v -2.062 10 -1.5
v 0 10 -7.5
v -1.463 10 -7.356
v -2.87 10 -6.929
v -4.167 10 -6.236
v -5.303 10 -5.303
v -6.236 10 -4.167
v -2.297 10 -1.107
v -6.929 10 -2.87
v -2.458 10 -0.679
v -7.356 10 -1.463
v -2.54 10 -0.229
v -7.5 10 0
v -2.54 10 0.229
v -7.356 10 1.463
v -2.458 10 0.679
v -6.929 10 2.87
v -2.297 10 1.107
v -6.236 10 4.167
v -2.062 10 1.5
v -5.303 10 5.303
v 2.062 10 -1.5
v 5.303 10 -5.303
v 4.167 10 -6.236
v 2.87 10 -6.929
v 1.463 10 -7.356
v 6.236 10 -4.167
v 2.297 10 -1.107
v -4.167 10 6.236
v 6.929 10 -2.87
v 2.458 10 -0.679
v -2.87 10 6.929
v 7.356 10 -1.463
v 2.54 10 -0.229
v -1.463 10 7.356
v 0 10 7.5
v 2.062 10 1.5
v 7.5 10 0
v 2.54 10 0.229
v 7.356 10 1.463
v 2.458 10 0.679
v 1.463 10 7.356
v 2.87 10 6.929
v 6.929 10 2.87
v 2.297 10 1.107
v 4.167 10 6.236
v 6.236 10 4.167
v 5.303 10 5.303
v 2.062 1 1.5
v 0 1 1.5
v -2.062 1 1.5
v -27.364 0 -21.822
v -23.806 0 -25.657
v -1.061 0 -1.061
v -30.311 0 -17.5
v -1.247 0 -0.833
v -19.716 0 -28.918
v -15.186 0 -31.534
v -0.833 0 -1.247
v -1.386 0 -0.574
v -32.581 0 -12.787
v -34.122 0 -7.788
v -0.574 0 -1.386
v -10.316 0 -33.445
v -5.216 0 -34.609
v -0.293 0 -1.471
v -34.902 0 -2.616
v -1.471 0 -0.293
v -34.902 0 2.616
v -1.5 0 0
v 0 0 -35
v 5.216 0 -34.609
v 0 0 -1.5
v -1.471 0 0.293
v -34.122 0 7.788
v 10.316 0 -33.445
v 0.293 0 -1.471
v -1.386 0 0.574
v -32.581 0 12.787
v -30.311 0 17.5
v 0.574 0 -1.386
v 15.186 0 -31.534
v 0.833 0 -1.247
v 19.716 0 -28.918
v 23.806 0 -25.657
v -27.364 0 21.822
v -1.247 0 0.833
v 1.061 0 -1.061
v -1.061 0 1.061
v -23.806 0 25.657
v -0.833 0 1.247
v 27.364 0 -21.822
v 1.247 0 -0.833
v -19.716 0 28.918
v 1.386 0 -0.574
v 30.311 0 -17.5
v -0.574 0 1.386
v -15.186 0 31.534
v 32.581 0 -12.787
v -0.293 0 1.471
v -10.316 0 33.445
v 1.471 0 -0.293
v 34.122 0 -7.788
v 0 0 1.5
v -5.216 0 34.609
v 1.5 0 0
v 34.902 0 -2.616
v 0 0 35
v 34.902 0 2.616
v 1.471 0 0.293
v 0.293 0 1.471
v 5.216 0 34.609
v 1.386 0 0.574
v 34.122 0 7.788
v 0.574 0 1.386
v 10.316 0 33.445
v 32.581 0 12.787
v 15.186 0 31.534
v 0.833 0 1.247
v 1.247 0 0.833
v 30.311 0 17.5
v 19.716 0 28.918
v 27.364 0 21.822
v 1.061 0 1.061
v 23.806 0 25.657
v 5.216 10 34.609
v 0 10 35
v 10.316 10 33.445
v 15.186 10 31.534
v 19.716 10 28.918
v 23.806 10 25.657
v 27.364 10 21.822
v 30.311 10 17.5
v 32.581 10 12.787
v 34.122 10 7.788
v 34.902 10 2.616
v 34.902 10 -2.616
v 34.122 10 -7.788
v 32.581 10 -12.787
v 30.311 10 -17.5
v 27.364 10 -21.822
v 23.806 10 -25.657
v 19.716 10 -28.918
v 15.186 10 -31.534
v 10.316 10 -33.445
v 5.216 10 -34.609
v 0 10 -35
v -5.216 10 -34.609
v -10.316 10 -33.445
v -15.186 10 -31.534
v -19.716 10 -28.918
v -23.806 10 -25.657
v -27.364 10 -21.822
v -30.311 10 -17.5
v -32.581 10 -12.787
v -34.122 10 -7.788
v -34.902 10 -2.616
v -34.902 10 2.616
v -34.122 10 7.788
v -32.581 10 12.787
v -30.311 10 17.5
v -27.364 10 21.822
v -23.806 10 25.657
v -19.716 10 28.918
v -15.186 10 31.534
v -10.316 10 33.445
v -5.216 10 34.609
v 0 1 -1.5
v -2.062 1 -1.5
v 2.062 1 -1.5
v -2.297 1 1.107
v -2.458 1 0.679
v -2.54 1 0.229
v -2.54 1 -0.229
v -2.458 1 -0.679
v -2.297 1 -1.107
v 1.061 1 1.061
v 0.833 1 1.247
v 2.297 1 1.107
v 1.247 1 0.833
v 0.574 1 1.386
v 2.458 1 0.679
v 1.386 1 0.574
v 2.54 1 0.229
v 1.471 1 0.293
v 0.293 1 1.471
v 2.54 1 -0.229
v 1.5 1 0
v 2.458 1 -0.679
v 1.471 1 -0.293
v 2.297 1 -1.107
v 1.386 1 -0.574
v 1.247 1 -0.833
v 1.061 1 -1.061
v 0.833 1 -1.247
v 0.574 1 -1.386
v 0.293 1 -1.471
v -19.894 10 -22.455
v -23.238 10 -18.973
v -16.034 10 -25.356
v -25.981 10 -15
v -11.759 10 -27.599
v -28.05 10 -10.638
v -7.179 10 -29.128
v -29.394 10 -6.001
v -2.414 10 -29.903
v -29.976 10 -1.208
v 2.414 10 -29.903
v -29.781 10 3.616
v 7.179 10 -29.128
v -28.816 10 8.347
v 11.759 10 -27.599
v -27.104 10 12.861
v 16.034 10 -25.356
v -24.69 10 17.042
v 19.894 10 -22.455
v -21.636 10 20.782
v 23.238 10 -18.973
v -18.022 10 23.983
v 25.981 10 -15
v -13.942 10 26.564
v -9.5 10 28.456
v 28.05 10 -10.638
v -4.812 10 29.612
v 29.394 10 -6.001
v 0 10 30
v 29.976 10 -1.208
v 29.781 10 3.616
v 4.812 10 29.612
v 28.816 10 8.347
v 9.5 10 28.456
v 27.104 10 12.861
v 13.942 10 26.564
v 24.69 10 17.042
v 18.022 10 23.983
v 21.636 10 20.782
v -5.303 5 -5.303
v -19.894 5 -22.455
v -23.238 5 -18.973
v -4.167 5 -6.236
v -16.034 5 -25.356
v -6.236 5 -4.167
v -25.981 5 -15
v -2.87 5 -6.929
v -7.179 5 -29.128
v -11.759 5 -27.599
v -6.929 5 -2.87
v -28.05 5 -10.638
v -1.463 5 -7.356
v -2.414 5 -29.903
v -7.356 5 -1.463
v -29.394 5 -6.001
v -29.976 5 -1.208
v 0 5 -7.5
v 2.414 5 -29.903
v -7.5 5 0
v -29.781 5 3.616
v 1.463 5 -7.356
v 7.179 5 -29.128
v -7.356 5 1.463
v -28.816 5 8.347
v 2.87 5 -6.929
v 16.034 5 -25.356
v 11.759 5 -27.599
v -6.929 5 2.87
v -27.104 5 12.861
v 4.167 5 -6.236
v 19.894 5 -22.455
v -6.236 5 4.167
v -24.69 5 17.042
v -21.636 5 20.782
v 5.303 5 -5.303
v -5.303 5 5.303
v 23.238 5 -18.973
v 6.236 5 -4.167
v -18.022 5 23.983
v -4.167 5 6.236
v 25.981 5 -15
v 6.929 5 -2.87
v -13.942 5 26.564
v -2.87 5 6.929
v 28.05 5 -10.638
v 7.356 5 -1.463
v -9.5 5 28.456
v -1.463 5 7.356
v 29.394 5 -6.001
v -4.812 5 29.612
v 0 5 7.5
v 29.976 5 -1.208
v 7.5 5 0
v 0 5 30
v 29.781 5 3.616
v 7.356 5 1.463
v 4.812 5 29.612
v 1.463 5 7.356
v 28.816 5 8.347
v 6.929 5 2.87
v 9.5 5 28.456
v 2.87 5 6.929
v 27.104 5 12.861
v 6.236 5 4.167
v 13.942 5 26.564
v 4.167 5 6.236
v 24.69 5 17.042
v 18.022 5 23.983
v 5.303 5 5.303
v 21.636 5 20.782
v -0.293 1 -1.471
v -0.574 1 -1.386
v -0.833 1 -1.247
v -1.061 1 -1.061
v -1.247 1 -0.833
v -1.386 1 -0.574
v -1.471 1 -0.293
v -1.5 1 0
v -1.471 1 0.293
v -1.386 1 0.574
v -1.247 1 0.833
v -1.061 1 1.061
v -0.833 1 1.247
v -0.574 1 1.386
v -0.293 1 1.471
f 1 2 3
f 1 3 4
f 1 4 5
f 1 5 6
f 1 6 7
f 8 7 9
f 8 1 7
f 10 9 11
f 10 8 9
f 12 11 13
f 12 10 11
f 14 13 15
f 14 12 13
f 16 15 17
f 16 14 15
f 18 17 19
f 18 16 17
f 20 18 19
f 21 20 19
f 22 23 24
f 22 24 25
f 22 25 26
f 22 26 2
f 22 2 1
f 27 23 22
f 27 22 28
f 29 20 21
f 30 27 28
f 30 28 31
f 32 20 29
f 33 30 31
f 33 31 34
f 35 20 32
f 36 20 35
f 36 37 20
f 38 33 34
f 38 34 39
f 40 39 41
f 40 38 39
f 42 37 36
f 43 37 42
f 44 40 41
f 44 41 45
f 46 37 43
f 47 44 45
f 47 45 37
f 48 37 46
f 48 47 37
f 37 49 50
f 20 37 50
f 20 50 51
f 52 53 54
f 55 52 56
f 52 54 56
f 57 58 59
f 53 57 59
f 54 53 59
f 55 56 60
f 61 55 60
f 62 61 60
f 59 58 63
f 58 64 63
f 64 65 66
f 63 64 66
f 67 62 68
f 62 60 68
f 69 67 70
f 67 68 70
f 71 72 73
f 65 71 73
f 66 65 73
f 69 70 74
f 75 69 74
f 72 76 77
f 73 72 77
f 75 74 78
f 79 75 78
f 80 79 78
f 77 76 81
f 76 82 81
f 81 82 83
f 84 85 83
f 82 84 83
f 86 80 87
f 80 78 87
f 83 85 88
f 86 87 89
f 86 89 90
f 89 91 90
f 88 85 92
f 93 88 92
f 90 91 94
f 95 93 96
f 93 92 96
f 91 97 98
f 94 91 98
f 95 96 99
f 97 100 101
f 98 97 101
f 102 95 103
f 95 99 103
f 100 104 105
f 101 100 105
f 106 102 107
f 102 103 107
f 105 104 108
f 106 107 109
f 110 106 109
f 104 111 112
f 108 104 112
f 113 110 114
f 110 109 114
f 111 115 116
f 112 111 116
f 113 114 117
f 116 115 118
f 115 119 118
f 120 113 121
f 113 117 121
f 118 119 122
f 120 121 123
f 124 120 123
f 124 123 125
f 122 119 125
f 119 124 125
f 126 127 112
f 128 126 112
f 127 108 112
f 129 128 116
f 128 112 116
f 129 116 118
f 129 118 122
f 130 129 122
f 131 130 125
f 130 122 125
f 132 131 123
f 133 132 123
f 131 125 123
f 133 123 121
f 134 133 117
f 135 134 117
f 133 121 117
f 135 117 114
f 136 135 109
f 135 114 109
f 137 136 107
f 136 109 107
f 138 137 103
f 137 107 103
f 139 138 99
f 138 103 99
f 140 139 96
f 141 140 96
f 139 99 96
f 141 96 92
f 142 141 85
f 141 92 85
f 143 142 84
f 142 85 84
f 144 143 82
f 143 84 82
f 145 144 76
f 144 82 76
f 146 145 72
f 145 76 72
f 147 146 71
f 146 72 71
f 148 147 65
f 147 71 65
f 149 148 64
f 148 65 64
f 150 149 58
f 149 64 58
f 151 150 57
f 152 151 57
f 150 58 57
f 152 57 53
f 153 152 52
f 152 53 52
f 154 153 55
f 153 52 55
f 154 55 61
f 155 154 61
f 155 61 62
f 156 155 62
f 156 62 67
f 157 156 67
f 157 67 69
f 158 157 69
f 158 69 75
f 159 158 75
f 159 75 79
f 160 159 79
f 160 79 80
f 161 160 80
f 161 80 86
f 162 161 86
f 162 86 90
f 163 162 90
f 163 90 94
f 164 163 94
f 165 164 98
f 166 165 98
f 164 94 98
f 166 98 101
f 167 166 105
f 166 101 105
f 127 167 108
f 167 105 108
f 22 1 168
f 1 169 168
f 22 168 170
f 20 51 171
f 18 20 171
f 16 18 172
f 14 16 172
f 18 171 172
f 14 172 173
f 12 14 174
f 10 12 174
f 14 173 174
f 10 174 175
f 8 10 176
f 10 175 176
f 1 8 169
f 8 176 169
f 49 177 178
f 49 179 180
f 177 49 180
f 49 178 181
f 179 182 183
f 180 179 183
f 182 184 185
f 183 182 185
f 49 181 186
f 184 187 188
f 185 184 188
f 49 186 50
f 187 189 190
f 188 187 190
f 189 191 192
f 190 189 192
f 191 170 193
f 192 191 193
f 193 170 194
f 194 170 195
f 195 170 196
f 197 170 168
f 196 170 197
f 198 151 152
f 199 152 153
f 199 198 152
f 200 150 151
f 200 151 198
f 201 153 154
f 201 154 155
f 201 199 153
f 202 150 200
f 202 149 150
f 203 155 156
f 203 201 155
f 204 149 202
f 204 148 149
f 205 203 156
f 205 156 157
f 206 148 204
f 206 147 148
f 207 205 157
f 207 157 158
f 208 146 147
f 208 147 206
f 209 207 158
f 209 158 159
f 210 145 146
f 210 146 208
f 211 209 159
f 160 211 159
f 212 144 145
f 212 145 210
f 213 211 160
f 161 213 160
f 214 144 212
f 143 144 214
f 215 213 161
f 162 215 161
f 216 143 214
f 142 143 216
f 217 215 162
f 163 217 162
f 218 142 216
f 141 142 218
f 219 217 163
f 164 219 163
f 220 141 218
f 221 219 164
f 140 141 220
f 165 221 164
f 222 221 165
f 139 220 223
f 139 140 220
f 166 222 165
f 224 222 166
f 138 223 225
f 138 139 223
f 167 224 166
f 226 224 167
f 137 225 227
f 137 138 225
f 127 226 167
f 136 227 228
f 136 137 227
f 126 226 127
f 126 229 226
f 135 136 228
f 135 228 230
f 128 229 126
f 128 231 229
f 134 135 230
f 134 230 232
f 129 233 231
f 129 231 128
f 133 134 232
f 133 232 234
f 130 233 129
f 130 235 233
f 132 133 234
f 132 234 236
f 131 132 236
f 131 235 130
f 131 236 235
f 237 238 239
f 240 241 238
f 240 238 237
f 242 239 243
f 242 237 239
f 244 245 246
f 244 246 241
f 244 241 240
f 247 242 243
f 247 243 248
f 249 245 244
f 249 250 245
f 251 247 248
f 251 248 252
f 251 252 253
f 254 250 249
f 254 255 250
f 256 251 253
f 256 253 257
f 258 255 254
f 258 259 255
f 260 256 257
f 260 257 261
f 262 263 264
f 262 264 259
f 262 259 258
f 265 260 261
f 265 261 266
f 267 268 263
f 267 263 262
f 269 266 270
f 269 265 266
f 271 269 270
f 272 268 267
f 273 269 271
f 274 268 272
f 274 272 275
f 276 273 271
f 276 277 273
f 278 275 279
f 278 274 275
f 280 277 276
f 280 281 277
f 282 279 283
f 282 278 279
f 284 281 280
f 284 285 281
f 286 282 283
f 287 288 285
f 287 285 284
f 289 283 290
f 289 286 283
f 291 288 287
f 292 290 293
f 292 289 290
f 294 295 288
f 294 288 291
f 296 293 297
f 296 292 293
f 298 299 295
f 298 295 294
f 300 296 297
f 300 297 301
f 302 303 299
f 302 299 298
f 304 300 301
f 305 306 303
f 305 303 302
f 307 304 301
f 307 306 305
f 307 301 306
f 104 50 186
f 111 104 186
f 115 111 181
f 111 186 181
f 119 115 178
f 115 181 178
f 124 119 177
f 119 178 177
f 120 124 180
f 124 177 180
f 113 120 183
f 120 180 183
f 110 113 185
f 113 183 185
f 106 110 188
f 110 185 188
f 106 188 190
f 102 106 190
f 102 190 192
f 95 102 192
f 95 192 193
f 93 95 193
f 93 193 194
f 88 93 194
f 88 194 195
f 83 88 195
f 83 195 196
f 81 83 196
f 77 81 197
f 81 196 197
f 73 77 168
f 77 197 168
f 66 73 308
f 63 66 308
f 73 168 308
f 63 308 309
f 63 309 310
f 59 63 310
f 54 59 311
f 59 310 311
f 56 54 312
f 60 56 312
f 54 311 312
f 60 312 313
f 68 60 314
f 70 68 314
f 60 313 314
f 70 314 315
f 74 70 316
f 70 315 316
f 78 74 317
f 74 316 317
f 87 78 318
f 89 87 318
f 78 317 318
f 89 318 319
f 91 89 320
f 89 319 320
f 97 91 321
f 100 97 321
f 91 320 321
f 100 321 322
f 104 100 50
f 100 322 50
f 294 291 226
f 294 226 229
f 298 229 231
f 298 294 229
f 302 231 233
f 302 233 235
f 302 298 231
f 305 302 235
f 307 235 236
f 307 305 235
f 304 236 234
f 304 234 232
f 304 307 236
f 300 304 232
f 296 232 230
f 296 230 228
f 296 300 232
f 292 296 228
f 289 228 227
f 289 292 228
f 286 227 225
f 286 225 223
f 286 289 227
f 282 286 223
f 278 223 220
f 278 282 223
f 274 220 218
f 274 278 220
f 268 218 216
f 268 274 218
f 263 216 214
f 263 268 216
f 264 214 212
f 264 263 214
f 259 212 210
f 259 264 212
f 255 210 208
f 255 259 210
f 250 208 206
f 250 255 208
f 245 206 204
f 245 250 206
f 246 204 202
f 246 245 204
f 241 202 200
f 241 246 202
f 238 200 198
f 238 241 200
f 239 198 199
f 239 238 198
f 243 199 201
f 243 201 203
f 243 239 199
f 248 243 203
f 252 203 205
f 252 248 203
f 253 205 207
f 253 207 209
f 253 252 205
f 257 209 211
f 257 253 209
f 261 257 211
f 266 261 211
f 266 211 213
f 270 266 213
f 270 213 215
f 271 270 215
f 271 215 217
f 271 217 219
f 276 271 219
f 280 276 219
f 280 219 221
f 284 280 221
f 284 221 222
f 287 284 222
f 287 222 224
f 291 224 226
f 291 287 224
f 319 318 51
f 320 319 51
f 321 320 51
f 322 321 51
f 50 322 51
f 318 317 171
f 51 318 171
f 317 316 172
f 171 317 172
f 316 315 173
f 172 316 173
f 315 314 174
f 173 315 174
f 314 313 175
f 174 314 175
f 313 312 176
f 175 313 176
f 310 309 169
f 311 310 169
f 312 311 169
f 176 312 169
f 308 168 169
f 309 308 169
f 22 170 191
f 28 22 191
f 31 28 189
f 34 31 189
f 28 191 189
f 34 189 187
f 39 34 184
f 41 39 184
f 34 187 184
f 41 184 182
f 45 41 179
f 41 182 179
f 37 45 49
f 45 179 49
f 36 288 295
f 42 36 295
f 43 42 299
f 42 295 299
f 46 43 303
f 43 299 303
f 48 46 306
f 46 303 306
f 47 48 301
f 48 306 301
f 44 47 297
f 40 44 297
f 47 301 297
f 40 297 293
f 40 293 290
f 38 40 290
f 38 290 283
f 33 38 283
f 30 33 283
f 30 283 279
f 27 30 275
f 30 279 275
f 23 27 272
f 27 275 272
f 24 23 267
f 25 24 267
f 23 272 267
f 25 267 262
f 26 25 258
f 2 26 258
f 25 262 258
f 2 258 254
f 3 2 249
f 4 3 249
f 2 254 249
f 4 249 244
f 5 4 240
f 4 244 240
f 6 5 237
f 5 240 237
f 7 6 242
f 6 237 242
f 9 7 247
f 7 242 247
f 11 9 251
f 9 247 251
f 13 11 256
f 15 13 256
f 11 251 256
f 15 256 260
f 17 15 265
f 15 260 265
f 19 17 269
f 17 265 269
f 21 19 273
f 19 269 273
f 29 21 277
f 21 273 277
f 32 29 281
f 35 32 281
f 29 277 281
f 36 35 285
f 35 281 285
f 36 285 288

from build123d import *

# Parameters (mm, degrees)
IZIM1_R                     = 35
Y_KSEKLIK_EKSTR_ZYON1_DEPTH = 5
IZIM2_R                     = 7.5
Y_KSEKLIK_EKSTR_ZYON2_DEPTH = 5
KES_EKSTR_ZYON1_START       = -4
KES_EKSTR_ZYON1_DEPTH       = 4
IZIM4_R                     = 1.5
KES_EKSTR_ZYON2_DEPTH       = 4
IZIM5_R                     = 35
IZIM5_R_2                   = 30
Y_KSEKLIK_EKSTR_ZYON3_DEPTH = 5


with BuildPart() as part:
    # Çizim1 → Yükseklik-Ekstrüzyon1 (new body)
    with BuildSketch(Plane(origin=(0, 0, 0), x_dir=(1, 0, 0), z_dir=(0, 1, 0))):
        with Locations(Location((0, 0, 0), (0, 0, 270))):
            Circle(IZIM1_R)
    extrude(amount=Y_KSEKLIK_EKSTR_ZYON1_DEPTH)

    # Çizim2 → Yükseklik-Ekstrüzyon2 (add)
    with BuildSketch(Plane(origin=(0, 5, 0), x_dir=(1, 0, 0), z_dir=(0, 1, 0))):
        with Locations(Location((0, 0, 0), (0, 0, 270))):
            Circle(IZIM2_R)
        with BuildLine():
            Line((-2.062159063, 1.5), (2.062159063, 1.5))
            ThreePointArc((2.062159063, 1.5), (2.55, 0), (2.062159063, -1.5))
            Line((2.062159063, -1.5), (-2.062159063, -1.5))
            ThreePointArc((-2.062159063, -1.5), (-2.55, 0), (-2.062159063, 1.5))
        make_face(mode=Mode.SUBTRACT)
    extrude(amount=Y_KSEKLIK_EKSTR_ZYON2_DEPTH)

    # Çizim3 → Kes-Ekstrüzyon1 (cut)
    with BuildSketch(Plane(origin=(0, 5, 0), x_dir=(1, 0, 0), z_dir=(0, 1, 0)).offset(KES_EKSTR_ZYON1_START)):
        with BuildLine():
            Line((-2.062159063, 1.5), (2.062159063, 1.5))
            ThreePointArc((2.062159063, 1.5), (2.55, 0), (2.062159063, -1.5))
            Line((2.062159063, -1.5), (-2.062159063, -1.5))
            ThreePointArc((-2.062159063, -1.5), (-2.55, 0), (-2.062159063, 1.5))
        make_face()
    extrude(amount=KES_EKSTR_ZYON1_DEPTH, mode=Mode.SUBTRACT)

    # Çizim4 → Kes-Ekstrüzyon2 (cut)
    with BuildSketch(Plane(origin=(0, 1, 0), x_dir=(1, 0, 0), z_dir=(0, 1, 0))):
        with Locations(Location((0, 0, 0), (0, 0, 270))):
            Circle(IZIM4_R)
    extrude(amount=-KES_EKSTR_ZYON2_DEPTH, mode=Mode.SUBTRACT)

    # Çizim5 → Yükseklik-Ekstrüzyon3 (add)
    with BuildSketch(Plane(origin=(0, 5, 0), x_dir=(1, 0, 0), z_dir=(0, 1, 0))):
        with Locations(Location((0, 0, 0), (0, 0, 270))):
            Circle(IZIM5_R)
        with Locations(Location((0, 0, 0), (0, 0, 270))):
            Circle(IZIM5_R_2, mode=Mode.SUBTRACT)
    extrude(amount=Y_KSEKLIK_EKSTR_ZYON3_DEPTH)


solid = part.part
